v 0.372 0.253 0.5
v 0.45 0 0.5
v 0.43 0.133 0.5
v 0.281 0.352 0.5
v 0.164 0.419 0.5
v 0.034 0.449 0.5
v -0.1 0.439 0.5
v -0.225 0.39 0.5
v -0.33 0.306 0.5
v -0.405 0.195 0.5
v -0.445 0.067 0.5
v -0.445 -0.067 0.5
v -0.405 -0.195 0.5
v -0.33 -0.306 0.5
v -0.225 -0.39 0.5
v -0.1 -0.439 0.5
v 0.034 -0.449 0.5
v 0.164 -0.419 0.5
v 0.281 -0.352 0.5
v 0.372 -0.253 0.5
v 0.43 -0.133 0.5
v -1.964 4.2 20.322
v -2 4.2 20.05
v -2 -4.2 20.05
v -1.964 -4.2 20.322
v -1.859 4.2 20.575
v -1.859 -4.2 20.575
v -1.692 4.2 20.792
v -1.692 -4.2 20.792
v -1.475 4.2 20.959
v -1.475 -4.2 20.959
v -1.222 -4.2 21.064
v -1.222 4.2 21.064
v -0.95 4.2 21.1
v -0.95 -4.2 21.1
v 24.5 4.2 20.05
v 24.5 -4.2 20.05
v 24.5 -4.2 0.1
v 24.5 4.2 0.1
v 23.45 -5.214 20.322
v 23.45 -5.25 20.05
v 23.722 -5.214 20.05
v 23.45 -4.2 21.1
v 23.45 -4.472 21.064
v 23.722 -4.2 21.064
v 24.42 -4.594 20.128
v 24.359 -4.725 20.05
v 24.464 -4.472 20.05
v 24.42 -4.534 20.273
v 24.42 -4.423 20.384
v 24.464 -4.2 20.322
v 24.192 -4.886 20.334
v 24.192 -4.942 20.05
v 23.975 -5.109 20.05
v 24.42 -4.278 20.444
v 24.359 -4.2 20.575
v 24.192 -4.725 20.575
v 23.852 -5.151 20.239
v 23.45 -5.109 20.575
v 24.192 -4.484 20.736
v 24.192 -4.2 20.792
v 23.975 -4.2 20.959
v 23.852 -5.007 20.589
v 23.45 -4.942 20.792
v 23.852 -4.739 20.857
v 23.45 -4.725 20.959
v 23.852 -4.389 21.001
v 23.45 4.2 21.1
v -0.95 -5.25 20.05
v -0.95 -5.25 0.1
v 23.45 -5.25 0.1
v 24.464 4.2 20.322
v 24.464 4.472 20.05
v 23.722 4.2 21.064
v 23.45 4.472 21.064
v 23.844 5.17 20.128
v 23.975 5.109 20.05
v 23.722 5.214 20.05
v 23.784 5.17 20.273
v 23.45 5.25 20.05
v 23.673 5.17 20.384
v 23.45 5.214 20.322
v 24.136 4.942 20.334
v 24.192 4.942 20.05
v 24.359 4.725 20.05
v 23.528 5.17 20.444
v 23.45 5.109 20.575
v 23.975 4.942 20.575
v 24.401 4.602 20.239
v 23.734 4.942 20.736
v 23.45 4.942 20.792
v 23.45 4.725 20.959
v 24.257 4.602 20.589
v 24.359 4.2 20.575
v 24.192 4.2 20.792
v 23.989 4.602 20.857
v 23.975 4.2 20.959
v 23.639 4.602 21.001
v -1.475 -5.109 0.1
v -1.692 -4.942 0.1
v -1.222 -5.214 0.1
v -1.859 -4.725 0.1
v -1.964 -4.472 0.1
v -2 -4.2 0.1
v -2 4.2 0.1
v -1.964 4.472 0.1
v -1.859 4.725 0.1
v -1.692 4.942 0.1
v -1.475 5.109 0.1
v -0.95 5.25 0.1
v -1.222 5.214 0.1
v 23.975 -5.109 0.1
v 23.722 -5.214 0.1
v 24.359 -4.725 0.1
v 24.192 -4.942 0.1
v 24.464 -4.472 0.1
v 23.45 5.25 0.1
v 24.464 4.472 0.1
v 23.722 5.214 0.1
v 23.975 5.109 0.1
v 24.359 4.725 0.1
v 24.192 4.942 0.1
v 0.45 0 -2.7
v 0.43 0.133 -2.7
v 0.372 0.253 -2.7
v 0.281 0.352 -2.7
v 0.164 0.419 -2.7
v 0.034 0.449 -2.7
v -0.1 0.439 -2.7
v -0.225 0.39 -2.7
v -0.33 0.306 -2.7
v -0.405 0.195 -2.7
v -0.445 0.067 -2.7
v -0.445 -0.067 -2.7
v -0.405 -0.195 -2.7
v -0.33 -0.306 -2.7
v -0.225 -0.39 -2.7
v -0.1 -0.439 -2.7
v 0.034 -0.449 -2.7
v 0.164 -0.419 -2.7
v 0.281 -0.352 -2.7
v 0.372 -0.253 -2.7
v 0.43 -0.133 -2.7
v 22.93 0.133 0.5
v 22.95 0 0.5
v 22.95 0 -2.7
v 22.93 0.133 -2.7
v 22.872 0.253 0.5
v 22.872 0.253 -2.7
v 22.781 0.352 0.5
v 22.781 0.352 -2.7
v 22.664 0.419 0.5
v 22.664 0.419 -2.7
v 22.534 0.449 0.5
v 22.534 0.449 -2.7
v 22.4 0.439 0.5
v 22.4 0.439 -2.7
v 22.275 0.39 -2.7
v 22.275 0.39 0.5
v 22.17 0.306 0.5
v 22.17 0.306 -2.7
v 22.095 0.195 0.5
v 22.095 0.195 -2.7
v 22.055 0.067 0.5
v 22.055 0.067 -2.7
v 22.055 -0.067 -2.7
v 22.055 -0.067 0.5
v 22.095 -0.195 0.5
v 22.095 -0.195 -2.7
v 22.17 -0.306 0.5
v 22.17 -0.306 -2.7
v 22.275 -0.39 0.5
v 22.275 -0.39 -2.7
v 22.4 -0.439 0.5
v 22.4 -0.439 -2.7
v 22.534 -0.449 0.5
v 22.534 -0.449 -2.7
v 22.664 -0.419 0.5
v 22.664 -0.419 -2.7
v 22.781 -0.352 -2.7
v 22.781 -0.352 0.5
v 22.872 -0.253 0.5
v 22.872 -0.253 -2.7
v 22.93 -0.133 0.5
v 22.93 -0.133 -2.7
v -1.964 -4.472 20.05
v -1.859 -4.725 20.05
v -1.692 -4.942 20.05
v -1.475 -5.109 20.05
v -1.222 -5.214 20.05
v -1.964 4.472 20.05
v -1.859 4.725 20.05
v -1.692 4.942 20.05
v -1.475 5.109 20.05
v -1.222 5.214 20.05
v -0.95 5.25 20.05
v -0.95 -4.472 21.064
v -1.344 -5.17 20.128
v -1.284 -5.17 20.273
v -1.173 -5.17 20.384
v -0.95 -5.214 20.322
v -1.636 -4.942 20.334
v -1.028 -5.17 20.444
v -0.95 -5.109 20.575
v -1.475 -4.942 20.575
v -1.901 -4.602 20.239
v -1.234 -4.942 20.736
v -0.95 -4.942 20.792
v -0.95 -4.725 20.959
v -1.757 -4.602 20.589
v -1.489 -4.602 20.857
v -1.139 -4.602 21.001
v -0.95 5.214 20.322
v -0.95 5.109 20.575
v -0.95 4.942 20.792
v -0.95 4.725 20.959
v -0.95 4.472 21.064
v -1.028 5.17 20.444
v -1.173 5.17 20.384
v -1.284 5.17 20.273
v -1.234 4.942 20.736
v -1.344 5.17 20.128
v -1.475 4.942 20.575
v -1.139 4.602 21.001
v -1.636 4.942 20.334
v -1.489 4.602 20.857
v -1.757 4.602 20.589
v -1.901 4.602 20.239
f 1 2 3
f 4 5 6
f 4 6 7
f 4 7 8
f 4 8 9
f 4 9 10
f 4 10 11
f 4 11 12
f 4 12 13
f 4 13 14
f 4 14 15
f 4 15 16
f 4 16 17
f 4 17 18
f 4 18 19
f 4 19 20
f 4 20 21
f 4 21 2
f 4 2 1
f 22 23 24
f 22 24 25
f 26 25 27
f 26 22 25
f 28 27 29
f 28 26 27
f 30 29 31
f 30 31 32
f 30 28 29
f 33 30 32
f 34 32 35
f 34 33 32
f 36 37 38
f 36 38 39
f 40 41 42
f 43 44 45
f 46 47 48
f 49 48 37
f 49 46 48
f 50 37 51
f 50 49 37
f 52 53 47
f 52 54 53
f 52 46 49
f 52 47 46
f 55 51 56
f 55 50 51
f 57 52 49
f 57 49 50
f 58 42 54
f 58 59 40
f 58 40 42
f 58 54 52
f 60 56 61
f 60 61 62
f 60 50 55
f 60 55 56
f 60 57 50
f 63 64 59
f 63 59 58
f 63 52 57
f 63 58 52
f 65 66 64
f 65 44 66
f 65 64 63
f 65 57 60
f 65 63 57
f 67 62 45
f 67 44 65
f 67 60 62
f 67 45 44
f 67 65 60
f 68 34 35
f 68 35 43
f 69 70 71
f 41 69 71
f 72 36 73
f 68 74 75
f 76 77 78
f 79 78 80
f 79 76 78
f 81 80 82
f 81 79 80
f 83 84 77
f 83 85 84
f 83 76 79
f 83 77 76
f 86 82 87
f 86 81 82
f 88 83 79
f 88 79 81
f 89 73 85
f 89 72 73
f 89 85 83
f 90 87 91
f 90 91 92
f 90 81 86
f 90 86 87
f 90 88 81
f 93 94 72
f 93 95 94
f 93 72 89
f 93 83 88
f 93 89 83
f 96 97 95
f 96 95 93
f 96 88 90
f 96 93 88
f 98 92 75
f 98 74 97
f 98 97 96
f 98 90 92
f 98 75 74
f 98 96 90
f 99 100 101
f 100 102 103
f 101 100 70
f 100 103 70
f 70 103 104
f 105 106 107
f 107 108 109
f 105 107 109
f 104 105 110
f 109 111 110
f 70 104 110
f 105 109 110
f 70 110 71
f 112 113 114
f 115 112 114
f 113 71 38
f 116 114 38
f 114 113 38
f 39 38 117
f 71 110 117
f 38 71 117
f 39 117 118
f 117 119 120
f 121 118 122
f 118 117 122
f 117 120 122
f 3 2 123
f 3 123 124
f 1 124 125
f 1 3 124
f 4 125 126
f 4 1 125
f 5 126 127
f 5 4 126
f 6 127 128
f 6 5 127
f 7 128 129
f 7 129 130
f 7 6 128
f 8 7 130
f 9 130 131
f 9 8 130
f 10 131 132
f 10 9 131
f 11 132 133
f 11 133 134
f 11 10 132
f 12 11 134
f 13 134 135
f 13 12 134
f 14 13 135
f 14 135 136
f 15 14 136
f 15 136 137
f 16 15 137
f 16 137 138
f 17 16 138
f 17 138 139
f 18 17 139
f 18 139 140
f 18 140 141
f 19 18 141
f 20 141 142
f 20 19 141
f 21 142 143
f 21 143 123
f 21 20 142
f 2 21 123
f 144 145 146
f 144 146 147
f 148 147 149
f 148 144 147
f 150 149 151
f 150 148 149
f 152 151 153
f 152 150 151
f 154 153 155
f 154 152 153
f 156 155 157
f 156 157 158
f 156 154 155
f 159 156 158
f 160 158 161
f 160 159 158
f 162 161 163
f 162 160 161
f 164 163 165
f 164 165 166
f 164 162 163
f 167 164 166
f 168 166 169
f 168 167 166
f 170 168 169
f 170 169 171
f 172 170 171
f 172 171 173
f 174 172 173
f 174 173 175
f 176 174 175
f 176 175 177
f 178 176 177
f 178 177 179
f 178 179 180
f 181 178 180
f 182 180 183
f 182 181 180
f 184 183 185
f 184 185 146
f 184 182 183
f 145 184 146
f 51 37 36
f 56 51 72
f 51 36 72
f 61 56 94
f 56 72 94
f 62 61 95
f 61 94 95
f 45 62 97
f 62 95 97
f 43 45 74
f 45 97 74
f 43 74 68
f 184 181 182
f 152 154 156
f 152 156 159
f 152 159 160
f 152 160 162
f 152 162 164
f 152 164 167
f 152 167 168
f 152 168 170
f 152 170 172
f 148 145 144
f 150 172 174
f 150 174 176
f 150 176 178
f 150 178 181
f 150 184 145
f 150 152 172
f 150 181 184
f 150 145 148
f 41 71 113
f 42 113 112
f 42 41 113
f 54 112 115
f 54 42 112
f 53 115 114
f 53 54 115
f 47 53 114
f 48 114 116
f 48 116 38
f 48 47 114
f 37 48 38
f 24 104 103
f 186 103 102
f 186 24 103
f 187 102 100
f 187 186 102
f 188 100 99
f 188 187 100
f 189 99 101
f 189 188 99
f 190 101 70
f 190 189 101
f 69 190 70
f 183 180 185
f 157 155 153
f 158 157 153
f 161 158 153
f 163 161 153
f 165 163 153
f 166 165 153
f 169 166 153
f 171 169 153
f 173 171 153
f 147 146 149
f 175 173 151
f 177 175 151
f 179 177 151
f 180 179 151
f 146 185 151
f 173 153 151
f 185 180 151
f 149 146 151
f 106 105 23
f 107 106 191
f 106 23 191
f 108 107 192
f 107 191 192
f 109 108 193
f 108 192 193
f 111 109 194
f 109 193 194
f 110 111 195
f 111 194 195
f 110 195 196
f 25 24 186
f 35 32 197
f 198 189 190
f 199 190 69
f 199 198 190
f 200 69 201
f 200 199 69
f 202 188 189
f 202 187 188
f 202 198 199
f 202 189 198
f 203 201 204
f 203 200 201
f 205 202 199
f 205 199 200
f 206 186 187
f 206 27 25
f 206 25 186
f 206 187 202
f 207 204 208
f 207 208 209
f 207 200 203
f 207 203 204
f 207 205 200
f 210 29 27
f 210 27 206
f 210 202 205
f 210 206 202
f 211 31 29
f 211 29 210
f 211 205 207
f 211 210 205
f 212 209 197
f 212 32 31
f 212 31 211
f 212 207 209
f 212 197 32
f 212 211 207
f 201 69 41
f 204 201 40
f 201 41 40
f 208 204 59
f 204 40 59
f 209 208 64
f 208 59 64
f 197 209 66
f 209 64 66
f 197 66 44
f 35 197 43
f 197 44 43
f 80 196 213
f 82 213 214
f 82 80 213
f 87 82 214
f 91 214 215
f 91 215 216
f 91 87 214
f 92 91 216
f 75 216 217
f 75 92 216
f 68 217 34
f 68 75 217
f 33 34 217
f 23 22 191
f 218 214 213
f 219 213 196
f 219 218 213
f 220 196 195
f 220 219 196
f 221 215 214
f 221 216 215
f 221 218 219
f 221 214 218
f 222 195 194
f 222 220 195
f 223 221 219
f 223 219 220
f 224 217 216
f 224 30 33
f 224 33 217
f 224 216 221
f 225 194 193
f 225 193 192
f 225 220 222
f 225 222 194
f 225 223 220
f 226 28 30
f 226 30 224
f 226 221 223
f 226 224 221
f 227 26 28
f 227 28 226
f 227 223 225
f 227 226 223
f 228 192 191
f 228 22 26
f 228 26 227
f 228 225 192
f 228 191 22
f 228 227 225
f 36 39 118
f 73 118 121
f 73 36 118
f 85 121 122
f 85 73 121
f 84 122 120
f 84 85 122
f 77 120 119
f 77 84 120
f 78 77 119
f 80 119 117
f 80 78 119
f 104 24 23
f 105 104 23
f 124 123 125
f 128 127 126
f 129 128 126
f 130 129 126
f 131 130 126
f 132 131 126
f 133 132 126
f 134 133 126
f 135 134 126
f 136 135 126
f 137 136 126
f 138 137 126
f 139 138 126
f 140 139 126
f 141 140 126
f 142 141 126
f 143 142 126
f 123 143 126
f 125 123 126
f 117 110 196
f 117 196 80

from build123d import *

# Parameters (mm, degrees)
SKETCH_W     = 26.5
SKETCH_H     = 10.5
PAD_DEPTH    = 21
FILLET_R     = 1.05
SKETCH001_R  = 0.45
PAD001_DEPTH = 3.2


with BuildPart() as fillet_body:
    # Sketch → Pad (new body)
    with BuildSketch(Plane.XY.offset(0.1)):
        with Locations((11.25, 0)):
            Rectangle(SKETCH_W, SKETCH_H)
    extrude(amount=PAD_DEPTH)

    # Fillet
    fillet_edges = [fillet_body.edges().sort_by_distance(p)[0] for p in [
        (-2, 0, 21.1),
        (-2, -5.25, 10.6),
        (11.25, -5.25, 21.1),
        (24.5, -5.25, 10.6),
        (24.5, 0, 21.1),
        (24.5, 5.25, 10.6),
        (11.25, 5.25, 21.1),
        (-2, 5.25, 10.6),
    ]]
    fillet(fillet_edges, radius=FILLET_R)


with BuildPart() as pad001:
    # Sketch001 → Pad001 (new body)
    with BuildSketch(Plane.XY.offset(0.5)):
        Circle(SKETCH001_R)
        with Locations((22.5, 0)):
            Circle(SKETCH001_R)
    extrude(amount=-PAD001_DEPTH)


solid = Compound([fillet_body.part, pad001.part])
